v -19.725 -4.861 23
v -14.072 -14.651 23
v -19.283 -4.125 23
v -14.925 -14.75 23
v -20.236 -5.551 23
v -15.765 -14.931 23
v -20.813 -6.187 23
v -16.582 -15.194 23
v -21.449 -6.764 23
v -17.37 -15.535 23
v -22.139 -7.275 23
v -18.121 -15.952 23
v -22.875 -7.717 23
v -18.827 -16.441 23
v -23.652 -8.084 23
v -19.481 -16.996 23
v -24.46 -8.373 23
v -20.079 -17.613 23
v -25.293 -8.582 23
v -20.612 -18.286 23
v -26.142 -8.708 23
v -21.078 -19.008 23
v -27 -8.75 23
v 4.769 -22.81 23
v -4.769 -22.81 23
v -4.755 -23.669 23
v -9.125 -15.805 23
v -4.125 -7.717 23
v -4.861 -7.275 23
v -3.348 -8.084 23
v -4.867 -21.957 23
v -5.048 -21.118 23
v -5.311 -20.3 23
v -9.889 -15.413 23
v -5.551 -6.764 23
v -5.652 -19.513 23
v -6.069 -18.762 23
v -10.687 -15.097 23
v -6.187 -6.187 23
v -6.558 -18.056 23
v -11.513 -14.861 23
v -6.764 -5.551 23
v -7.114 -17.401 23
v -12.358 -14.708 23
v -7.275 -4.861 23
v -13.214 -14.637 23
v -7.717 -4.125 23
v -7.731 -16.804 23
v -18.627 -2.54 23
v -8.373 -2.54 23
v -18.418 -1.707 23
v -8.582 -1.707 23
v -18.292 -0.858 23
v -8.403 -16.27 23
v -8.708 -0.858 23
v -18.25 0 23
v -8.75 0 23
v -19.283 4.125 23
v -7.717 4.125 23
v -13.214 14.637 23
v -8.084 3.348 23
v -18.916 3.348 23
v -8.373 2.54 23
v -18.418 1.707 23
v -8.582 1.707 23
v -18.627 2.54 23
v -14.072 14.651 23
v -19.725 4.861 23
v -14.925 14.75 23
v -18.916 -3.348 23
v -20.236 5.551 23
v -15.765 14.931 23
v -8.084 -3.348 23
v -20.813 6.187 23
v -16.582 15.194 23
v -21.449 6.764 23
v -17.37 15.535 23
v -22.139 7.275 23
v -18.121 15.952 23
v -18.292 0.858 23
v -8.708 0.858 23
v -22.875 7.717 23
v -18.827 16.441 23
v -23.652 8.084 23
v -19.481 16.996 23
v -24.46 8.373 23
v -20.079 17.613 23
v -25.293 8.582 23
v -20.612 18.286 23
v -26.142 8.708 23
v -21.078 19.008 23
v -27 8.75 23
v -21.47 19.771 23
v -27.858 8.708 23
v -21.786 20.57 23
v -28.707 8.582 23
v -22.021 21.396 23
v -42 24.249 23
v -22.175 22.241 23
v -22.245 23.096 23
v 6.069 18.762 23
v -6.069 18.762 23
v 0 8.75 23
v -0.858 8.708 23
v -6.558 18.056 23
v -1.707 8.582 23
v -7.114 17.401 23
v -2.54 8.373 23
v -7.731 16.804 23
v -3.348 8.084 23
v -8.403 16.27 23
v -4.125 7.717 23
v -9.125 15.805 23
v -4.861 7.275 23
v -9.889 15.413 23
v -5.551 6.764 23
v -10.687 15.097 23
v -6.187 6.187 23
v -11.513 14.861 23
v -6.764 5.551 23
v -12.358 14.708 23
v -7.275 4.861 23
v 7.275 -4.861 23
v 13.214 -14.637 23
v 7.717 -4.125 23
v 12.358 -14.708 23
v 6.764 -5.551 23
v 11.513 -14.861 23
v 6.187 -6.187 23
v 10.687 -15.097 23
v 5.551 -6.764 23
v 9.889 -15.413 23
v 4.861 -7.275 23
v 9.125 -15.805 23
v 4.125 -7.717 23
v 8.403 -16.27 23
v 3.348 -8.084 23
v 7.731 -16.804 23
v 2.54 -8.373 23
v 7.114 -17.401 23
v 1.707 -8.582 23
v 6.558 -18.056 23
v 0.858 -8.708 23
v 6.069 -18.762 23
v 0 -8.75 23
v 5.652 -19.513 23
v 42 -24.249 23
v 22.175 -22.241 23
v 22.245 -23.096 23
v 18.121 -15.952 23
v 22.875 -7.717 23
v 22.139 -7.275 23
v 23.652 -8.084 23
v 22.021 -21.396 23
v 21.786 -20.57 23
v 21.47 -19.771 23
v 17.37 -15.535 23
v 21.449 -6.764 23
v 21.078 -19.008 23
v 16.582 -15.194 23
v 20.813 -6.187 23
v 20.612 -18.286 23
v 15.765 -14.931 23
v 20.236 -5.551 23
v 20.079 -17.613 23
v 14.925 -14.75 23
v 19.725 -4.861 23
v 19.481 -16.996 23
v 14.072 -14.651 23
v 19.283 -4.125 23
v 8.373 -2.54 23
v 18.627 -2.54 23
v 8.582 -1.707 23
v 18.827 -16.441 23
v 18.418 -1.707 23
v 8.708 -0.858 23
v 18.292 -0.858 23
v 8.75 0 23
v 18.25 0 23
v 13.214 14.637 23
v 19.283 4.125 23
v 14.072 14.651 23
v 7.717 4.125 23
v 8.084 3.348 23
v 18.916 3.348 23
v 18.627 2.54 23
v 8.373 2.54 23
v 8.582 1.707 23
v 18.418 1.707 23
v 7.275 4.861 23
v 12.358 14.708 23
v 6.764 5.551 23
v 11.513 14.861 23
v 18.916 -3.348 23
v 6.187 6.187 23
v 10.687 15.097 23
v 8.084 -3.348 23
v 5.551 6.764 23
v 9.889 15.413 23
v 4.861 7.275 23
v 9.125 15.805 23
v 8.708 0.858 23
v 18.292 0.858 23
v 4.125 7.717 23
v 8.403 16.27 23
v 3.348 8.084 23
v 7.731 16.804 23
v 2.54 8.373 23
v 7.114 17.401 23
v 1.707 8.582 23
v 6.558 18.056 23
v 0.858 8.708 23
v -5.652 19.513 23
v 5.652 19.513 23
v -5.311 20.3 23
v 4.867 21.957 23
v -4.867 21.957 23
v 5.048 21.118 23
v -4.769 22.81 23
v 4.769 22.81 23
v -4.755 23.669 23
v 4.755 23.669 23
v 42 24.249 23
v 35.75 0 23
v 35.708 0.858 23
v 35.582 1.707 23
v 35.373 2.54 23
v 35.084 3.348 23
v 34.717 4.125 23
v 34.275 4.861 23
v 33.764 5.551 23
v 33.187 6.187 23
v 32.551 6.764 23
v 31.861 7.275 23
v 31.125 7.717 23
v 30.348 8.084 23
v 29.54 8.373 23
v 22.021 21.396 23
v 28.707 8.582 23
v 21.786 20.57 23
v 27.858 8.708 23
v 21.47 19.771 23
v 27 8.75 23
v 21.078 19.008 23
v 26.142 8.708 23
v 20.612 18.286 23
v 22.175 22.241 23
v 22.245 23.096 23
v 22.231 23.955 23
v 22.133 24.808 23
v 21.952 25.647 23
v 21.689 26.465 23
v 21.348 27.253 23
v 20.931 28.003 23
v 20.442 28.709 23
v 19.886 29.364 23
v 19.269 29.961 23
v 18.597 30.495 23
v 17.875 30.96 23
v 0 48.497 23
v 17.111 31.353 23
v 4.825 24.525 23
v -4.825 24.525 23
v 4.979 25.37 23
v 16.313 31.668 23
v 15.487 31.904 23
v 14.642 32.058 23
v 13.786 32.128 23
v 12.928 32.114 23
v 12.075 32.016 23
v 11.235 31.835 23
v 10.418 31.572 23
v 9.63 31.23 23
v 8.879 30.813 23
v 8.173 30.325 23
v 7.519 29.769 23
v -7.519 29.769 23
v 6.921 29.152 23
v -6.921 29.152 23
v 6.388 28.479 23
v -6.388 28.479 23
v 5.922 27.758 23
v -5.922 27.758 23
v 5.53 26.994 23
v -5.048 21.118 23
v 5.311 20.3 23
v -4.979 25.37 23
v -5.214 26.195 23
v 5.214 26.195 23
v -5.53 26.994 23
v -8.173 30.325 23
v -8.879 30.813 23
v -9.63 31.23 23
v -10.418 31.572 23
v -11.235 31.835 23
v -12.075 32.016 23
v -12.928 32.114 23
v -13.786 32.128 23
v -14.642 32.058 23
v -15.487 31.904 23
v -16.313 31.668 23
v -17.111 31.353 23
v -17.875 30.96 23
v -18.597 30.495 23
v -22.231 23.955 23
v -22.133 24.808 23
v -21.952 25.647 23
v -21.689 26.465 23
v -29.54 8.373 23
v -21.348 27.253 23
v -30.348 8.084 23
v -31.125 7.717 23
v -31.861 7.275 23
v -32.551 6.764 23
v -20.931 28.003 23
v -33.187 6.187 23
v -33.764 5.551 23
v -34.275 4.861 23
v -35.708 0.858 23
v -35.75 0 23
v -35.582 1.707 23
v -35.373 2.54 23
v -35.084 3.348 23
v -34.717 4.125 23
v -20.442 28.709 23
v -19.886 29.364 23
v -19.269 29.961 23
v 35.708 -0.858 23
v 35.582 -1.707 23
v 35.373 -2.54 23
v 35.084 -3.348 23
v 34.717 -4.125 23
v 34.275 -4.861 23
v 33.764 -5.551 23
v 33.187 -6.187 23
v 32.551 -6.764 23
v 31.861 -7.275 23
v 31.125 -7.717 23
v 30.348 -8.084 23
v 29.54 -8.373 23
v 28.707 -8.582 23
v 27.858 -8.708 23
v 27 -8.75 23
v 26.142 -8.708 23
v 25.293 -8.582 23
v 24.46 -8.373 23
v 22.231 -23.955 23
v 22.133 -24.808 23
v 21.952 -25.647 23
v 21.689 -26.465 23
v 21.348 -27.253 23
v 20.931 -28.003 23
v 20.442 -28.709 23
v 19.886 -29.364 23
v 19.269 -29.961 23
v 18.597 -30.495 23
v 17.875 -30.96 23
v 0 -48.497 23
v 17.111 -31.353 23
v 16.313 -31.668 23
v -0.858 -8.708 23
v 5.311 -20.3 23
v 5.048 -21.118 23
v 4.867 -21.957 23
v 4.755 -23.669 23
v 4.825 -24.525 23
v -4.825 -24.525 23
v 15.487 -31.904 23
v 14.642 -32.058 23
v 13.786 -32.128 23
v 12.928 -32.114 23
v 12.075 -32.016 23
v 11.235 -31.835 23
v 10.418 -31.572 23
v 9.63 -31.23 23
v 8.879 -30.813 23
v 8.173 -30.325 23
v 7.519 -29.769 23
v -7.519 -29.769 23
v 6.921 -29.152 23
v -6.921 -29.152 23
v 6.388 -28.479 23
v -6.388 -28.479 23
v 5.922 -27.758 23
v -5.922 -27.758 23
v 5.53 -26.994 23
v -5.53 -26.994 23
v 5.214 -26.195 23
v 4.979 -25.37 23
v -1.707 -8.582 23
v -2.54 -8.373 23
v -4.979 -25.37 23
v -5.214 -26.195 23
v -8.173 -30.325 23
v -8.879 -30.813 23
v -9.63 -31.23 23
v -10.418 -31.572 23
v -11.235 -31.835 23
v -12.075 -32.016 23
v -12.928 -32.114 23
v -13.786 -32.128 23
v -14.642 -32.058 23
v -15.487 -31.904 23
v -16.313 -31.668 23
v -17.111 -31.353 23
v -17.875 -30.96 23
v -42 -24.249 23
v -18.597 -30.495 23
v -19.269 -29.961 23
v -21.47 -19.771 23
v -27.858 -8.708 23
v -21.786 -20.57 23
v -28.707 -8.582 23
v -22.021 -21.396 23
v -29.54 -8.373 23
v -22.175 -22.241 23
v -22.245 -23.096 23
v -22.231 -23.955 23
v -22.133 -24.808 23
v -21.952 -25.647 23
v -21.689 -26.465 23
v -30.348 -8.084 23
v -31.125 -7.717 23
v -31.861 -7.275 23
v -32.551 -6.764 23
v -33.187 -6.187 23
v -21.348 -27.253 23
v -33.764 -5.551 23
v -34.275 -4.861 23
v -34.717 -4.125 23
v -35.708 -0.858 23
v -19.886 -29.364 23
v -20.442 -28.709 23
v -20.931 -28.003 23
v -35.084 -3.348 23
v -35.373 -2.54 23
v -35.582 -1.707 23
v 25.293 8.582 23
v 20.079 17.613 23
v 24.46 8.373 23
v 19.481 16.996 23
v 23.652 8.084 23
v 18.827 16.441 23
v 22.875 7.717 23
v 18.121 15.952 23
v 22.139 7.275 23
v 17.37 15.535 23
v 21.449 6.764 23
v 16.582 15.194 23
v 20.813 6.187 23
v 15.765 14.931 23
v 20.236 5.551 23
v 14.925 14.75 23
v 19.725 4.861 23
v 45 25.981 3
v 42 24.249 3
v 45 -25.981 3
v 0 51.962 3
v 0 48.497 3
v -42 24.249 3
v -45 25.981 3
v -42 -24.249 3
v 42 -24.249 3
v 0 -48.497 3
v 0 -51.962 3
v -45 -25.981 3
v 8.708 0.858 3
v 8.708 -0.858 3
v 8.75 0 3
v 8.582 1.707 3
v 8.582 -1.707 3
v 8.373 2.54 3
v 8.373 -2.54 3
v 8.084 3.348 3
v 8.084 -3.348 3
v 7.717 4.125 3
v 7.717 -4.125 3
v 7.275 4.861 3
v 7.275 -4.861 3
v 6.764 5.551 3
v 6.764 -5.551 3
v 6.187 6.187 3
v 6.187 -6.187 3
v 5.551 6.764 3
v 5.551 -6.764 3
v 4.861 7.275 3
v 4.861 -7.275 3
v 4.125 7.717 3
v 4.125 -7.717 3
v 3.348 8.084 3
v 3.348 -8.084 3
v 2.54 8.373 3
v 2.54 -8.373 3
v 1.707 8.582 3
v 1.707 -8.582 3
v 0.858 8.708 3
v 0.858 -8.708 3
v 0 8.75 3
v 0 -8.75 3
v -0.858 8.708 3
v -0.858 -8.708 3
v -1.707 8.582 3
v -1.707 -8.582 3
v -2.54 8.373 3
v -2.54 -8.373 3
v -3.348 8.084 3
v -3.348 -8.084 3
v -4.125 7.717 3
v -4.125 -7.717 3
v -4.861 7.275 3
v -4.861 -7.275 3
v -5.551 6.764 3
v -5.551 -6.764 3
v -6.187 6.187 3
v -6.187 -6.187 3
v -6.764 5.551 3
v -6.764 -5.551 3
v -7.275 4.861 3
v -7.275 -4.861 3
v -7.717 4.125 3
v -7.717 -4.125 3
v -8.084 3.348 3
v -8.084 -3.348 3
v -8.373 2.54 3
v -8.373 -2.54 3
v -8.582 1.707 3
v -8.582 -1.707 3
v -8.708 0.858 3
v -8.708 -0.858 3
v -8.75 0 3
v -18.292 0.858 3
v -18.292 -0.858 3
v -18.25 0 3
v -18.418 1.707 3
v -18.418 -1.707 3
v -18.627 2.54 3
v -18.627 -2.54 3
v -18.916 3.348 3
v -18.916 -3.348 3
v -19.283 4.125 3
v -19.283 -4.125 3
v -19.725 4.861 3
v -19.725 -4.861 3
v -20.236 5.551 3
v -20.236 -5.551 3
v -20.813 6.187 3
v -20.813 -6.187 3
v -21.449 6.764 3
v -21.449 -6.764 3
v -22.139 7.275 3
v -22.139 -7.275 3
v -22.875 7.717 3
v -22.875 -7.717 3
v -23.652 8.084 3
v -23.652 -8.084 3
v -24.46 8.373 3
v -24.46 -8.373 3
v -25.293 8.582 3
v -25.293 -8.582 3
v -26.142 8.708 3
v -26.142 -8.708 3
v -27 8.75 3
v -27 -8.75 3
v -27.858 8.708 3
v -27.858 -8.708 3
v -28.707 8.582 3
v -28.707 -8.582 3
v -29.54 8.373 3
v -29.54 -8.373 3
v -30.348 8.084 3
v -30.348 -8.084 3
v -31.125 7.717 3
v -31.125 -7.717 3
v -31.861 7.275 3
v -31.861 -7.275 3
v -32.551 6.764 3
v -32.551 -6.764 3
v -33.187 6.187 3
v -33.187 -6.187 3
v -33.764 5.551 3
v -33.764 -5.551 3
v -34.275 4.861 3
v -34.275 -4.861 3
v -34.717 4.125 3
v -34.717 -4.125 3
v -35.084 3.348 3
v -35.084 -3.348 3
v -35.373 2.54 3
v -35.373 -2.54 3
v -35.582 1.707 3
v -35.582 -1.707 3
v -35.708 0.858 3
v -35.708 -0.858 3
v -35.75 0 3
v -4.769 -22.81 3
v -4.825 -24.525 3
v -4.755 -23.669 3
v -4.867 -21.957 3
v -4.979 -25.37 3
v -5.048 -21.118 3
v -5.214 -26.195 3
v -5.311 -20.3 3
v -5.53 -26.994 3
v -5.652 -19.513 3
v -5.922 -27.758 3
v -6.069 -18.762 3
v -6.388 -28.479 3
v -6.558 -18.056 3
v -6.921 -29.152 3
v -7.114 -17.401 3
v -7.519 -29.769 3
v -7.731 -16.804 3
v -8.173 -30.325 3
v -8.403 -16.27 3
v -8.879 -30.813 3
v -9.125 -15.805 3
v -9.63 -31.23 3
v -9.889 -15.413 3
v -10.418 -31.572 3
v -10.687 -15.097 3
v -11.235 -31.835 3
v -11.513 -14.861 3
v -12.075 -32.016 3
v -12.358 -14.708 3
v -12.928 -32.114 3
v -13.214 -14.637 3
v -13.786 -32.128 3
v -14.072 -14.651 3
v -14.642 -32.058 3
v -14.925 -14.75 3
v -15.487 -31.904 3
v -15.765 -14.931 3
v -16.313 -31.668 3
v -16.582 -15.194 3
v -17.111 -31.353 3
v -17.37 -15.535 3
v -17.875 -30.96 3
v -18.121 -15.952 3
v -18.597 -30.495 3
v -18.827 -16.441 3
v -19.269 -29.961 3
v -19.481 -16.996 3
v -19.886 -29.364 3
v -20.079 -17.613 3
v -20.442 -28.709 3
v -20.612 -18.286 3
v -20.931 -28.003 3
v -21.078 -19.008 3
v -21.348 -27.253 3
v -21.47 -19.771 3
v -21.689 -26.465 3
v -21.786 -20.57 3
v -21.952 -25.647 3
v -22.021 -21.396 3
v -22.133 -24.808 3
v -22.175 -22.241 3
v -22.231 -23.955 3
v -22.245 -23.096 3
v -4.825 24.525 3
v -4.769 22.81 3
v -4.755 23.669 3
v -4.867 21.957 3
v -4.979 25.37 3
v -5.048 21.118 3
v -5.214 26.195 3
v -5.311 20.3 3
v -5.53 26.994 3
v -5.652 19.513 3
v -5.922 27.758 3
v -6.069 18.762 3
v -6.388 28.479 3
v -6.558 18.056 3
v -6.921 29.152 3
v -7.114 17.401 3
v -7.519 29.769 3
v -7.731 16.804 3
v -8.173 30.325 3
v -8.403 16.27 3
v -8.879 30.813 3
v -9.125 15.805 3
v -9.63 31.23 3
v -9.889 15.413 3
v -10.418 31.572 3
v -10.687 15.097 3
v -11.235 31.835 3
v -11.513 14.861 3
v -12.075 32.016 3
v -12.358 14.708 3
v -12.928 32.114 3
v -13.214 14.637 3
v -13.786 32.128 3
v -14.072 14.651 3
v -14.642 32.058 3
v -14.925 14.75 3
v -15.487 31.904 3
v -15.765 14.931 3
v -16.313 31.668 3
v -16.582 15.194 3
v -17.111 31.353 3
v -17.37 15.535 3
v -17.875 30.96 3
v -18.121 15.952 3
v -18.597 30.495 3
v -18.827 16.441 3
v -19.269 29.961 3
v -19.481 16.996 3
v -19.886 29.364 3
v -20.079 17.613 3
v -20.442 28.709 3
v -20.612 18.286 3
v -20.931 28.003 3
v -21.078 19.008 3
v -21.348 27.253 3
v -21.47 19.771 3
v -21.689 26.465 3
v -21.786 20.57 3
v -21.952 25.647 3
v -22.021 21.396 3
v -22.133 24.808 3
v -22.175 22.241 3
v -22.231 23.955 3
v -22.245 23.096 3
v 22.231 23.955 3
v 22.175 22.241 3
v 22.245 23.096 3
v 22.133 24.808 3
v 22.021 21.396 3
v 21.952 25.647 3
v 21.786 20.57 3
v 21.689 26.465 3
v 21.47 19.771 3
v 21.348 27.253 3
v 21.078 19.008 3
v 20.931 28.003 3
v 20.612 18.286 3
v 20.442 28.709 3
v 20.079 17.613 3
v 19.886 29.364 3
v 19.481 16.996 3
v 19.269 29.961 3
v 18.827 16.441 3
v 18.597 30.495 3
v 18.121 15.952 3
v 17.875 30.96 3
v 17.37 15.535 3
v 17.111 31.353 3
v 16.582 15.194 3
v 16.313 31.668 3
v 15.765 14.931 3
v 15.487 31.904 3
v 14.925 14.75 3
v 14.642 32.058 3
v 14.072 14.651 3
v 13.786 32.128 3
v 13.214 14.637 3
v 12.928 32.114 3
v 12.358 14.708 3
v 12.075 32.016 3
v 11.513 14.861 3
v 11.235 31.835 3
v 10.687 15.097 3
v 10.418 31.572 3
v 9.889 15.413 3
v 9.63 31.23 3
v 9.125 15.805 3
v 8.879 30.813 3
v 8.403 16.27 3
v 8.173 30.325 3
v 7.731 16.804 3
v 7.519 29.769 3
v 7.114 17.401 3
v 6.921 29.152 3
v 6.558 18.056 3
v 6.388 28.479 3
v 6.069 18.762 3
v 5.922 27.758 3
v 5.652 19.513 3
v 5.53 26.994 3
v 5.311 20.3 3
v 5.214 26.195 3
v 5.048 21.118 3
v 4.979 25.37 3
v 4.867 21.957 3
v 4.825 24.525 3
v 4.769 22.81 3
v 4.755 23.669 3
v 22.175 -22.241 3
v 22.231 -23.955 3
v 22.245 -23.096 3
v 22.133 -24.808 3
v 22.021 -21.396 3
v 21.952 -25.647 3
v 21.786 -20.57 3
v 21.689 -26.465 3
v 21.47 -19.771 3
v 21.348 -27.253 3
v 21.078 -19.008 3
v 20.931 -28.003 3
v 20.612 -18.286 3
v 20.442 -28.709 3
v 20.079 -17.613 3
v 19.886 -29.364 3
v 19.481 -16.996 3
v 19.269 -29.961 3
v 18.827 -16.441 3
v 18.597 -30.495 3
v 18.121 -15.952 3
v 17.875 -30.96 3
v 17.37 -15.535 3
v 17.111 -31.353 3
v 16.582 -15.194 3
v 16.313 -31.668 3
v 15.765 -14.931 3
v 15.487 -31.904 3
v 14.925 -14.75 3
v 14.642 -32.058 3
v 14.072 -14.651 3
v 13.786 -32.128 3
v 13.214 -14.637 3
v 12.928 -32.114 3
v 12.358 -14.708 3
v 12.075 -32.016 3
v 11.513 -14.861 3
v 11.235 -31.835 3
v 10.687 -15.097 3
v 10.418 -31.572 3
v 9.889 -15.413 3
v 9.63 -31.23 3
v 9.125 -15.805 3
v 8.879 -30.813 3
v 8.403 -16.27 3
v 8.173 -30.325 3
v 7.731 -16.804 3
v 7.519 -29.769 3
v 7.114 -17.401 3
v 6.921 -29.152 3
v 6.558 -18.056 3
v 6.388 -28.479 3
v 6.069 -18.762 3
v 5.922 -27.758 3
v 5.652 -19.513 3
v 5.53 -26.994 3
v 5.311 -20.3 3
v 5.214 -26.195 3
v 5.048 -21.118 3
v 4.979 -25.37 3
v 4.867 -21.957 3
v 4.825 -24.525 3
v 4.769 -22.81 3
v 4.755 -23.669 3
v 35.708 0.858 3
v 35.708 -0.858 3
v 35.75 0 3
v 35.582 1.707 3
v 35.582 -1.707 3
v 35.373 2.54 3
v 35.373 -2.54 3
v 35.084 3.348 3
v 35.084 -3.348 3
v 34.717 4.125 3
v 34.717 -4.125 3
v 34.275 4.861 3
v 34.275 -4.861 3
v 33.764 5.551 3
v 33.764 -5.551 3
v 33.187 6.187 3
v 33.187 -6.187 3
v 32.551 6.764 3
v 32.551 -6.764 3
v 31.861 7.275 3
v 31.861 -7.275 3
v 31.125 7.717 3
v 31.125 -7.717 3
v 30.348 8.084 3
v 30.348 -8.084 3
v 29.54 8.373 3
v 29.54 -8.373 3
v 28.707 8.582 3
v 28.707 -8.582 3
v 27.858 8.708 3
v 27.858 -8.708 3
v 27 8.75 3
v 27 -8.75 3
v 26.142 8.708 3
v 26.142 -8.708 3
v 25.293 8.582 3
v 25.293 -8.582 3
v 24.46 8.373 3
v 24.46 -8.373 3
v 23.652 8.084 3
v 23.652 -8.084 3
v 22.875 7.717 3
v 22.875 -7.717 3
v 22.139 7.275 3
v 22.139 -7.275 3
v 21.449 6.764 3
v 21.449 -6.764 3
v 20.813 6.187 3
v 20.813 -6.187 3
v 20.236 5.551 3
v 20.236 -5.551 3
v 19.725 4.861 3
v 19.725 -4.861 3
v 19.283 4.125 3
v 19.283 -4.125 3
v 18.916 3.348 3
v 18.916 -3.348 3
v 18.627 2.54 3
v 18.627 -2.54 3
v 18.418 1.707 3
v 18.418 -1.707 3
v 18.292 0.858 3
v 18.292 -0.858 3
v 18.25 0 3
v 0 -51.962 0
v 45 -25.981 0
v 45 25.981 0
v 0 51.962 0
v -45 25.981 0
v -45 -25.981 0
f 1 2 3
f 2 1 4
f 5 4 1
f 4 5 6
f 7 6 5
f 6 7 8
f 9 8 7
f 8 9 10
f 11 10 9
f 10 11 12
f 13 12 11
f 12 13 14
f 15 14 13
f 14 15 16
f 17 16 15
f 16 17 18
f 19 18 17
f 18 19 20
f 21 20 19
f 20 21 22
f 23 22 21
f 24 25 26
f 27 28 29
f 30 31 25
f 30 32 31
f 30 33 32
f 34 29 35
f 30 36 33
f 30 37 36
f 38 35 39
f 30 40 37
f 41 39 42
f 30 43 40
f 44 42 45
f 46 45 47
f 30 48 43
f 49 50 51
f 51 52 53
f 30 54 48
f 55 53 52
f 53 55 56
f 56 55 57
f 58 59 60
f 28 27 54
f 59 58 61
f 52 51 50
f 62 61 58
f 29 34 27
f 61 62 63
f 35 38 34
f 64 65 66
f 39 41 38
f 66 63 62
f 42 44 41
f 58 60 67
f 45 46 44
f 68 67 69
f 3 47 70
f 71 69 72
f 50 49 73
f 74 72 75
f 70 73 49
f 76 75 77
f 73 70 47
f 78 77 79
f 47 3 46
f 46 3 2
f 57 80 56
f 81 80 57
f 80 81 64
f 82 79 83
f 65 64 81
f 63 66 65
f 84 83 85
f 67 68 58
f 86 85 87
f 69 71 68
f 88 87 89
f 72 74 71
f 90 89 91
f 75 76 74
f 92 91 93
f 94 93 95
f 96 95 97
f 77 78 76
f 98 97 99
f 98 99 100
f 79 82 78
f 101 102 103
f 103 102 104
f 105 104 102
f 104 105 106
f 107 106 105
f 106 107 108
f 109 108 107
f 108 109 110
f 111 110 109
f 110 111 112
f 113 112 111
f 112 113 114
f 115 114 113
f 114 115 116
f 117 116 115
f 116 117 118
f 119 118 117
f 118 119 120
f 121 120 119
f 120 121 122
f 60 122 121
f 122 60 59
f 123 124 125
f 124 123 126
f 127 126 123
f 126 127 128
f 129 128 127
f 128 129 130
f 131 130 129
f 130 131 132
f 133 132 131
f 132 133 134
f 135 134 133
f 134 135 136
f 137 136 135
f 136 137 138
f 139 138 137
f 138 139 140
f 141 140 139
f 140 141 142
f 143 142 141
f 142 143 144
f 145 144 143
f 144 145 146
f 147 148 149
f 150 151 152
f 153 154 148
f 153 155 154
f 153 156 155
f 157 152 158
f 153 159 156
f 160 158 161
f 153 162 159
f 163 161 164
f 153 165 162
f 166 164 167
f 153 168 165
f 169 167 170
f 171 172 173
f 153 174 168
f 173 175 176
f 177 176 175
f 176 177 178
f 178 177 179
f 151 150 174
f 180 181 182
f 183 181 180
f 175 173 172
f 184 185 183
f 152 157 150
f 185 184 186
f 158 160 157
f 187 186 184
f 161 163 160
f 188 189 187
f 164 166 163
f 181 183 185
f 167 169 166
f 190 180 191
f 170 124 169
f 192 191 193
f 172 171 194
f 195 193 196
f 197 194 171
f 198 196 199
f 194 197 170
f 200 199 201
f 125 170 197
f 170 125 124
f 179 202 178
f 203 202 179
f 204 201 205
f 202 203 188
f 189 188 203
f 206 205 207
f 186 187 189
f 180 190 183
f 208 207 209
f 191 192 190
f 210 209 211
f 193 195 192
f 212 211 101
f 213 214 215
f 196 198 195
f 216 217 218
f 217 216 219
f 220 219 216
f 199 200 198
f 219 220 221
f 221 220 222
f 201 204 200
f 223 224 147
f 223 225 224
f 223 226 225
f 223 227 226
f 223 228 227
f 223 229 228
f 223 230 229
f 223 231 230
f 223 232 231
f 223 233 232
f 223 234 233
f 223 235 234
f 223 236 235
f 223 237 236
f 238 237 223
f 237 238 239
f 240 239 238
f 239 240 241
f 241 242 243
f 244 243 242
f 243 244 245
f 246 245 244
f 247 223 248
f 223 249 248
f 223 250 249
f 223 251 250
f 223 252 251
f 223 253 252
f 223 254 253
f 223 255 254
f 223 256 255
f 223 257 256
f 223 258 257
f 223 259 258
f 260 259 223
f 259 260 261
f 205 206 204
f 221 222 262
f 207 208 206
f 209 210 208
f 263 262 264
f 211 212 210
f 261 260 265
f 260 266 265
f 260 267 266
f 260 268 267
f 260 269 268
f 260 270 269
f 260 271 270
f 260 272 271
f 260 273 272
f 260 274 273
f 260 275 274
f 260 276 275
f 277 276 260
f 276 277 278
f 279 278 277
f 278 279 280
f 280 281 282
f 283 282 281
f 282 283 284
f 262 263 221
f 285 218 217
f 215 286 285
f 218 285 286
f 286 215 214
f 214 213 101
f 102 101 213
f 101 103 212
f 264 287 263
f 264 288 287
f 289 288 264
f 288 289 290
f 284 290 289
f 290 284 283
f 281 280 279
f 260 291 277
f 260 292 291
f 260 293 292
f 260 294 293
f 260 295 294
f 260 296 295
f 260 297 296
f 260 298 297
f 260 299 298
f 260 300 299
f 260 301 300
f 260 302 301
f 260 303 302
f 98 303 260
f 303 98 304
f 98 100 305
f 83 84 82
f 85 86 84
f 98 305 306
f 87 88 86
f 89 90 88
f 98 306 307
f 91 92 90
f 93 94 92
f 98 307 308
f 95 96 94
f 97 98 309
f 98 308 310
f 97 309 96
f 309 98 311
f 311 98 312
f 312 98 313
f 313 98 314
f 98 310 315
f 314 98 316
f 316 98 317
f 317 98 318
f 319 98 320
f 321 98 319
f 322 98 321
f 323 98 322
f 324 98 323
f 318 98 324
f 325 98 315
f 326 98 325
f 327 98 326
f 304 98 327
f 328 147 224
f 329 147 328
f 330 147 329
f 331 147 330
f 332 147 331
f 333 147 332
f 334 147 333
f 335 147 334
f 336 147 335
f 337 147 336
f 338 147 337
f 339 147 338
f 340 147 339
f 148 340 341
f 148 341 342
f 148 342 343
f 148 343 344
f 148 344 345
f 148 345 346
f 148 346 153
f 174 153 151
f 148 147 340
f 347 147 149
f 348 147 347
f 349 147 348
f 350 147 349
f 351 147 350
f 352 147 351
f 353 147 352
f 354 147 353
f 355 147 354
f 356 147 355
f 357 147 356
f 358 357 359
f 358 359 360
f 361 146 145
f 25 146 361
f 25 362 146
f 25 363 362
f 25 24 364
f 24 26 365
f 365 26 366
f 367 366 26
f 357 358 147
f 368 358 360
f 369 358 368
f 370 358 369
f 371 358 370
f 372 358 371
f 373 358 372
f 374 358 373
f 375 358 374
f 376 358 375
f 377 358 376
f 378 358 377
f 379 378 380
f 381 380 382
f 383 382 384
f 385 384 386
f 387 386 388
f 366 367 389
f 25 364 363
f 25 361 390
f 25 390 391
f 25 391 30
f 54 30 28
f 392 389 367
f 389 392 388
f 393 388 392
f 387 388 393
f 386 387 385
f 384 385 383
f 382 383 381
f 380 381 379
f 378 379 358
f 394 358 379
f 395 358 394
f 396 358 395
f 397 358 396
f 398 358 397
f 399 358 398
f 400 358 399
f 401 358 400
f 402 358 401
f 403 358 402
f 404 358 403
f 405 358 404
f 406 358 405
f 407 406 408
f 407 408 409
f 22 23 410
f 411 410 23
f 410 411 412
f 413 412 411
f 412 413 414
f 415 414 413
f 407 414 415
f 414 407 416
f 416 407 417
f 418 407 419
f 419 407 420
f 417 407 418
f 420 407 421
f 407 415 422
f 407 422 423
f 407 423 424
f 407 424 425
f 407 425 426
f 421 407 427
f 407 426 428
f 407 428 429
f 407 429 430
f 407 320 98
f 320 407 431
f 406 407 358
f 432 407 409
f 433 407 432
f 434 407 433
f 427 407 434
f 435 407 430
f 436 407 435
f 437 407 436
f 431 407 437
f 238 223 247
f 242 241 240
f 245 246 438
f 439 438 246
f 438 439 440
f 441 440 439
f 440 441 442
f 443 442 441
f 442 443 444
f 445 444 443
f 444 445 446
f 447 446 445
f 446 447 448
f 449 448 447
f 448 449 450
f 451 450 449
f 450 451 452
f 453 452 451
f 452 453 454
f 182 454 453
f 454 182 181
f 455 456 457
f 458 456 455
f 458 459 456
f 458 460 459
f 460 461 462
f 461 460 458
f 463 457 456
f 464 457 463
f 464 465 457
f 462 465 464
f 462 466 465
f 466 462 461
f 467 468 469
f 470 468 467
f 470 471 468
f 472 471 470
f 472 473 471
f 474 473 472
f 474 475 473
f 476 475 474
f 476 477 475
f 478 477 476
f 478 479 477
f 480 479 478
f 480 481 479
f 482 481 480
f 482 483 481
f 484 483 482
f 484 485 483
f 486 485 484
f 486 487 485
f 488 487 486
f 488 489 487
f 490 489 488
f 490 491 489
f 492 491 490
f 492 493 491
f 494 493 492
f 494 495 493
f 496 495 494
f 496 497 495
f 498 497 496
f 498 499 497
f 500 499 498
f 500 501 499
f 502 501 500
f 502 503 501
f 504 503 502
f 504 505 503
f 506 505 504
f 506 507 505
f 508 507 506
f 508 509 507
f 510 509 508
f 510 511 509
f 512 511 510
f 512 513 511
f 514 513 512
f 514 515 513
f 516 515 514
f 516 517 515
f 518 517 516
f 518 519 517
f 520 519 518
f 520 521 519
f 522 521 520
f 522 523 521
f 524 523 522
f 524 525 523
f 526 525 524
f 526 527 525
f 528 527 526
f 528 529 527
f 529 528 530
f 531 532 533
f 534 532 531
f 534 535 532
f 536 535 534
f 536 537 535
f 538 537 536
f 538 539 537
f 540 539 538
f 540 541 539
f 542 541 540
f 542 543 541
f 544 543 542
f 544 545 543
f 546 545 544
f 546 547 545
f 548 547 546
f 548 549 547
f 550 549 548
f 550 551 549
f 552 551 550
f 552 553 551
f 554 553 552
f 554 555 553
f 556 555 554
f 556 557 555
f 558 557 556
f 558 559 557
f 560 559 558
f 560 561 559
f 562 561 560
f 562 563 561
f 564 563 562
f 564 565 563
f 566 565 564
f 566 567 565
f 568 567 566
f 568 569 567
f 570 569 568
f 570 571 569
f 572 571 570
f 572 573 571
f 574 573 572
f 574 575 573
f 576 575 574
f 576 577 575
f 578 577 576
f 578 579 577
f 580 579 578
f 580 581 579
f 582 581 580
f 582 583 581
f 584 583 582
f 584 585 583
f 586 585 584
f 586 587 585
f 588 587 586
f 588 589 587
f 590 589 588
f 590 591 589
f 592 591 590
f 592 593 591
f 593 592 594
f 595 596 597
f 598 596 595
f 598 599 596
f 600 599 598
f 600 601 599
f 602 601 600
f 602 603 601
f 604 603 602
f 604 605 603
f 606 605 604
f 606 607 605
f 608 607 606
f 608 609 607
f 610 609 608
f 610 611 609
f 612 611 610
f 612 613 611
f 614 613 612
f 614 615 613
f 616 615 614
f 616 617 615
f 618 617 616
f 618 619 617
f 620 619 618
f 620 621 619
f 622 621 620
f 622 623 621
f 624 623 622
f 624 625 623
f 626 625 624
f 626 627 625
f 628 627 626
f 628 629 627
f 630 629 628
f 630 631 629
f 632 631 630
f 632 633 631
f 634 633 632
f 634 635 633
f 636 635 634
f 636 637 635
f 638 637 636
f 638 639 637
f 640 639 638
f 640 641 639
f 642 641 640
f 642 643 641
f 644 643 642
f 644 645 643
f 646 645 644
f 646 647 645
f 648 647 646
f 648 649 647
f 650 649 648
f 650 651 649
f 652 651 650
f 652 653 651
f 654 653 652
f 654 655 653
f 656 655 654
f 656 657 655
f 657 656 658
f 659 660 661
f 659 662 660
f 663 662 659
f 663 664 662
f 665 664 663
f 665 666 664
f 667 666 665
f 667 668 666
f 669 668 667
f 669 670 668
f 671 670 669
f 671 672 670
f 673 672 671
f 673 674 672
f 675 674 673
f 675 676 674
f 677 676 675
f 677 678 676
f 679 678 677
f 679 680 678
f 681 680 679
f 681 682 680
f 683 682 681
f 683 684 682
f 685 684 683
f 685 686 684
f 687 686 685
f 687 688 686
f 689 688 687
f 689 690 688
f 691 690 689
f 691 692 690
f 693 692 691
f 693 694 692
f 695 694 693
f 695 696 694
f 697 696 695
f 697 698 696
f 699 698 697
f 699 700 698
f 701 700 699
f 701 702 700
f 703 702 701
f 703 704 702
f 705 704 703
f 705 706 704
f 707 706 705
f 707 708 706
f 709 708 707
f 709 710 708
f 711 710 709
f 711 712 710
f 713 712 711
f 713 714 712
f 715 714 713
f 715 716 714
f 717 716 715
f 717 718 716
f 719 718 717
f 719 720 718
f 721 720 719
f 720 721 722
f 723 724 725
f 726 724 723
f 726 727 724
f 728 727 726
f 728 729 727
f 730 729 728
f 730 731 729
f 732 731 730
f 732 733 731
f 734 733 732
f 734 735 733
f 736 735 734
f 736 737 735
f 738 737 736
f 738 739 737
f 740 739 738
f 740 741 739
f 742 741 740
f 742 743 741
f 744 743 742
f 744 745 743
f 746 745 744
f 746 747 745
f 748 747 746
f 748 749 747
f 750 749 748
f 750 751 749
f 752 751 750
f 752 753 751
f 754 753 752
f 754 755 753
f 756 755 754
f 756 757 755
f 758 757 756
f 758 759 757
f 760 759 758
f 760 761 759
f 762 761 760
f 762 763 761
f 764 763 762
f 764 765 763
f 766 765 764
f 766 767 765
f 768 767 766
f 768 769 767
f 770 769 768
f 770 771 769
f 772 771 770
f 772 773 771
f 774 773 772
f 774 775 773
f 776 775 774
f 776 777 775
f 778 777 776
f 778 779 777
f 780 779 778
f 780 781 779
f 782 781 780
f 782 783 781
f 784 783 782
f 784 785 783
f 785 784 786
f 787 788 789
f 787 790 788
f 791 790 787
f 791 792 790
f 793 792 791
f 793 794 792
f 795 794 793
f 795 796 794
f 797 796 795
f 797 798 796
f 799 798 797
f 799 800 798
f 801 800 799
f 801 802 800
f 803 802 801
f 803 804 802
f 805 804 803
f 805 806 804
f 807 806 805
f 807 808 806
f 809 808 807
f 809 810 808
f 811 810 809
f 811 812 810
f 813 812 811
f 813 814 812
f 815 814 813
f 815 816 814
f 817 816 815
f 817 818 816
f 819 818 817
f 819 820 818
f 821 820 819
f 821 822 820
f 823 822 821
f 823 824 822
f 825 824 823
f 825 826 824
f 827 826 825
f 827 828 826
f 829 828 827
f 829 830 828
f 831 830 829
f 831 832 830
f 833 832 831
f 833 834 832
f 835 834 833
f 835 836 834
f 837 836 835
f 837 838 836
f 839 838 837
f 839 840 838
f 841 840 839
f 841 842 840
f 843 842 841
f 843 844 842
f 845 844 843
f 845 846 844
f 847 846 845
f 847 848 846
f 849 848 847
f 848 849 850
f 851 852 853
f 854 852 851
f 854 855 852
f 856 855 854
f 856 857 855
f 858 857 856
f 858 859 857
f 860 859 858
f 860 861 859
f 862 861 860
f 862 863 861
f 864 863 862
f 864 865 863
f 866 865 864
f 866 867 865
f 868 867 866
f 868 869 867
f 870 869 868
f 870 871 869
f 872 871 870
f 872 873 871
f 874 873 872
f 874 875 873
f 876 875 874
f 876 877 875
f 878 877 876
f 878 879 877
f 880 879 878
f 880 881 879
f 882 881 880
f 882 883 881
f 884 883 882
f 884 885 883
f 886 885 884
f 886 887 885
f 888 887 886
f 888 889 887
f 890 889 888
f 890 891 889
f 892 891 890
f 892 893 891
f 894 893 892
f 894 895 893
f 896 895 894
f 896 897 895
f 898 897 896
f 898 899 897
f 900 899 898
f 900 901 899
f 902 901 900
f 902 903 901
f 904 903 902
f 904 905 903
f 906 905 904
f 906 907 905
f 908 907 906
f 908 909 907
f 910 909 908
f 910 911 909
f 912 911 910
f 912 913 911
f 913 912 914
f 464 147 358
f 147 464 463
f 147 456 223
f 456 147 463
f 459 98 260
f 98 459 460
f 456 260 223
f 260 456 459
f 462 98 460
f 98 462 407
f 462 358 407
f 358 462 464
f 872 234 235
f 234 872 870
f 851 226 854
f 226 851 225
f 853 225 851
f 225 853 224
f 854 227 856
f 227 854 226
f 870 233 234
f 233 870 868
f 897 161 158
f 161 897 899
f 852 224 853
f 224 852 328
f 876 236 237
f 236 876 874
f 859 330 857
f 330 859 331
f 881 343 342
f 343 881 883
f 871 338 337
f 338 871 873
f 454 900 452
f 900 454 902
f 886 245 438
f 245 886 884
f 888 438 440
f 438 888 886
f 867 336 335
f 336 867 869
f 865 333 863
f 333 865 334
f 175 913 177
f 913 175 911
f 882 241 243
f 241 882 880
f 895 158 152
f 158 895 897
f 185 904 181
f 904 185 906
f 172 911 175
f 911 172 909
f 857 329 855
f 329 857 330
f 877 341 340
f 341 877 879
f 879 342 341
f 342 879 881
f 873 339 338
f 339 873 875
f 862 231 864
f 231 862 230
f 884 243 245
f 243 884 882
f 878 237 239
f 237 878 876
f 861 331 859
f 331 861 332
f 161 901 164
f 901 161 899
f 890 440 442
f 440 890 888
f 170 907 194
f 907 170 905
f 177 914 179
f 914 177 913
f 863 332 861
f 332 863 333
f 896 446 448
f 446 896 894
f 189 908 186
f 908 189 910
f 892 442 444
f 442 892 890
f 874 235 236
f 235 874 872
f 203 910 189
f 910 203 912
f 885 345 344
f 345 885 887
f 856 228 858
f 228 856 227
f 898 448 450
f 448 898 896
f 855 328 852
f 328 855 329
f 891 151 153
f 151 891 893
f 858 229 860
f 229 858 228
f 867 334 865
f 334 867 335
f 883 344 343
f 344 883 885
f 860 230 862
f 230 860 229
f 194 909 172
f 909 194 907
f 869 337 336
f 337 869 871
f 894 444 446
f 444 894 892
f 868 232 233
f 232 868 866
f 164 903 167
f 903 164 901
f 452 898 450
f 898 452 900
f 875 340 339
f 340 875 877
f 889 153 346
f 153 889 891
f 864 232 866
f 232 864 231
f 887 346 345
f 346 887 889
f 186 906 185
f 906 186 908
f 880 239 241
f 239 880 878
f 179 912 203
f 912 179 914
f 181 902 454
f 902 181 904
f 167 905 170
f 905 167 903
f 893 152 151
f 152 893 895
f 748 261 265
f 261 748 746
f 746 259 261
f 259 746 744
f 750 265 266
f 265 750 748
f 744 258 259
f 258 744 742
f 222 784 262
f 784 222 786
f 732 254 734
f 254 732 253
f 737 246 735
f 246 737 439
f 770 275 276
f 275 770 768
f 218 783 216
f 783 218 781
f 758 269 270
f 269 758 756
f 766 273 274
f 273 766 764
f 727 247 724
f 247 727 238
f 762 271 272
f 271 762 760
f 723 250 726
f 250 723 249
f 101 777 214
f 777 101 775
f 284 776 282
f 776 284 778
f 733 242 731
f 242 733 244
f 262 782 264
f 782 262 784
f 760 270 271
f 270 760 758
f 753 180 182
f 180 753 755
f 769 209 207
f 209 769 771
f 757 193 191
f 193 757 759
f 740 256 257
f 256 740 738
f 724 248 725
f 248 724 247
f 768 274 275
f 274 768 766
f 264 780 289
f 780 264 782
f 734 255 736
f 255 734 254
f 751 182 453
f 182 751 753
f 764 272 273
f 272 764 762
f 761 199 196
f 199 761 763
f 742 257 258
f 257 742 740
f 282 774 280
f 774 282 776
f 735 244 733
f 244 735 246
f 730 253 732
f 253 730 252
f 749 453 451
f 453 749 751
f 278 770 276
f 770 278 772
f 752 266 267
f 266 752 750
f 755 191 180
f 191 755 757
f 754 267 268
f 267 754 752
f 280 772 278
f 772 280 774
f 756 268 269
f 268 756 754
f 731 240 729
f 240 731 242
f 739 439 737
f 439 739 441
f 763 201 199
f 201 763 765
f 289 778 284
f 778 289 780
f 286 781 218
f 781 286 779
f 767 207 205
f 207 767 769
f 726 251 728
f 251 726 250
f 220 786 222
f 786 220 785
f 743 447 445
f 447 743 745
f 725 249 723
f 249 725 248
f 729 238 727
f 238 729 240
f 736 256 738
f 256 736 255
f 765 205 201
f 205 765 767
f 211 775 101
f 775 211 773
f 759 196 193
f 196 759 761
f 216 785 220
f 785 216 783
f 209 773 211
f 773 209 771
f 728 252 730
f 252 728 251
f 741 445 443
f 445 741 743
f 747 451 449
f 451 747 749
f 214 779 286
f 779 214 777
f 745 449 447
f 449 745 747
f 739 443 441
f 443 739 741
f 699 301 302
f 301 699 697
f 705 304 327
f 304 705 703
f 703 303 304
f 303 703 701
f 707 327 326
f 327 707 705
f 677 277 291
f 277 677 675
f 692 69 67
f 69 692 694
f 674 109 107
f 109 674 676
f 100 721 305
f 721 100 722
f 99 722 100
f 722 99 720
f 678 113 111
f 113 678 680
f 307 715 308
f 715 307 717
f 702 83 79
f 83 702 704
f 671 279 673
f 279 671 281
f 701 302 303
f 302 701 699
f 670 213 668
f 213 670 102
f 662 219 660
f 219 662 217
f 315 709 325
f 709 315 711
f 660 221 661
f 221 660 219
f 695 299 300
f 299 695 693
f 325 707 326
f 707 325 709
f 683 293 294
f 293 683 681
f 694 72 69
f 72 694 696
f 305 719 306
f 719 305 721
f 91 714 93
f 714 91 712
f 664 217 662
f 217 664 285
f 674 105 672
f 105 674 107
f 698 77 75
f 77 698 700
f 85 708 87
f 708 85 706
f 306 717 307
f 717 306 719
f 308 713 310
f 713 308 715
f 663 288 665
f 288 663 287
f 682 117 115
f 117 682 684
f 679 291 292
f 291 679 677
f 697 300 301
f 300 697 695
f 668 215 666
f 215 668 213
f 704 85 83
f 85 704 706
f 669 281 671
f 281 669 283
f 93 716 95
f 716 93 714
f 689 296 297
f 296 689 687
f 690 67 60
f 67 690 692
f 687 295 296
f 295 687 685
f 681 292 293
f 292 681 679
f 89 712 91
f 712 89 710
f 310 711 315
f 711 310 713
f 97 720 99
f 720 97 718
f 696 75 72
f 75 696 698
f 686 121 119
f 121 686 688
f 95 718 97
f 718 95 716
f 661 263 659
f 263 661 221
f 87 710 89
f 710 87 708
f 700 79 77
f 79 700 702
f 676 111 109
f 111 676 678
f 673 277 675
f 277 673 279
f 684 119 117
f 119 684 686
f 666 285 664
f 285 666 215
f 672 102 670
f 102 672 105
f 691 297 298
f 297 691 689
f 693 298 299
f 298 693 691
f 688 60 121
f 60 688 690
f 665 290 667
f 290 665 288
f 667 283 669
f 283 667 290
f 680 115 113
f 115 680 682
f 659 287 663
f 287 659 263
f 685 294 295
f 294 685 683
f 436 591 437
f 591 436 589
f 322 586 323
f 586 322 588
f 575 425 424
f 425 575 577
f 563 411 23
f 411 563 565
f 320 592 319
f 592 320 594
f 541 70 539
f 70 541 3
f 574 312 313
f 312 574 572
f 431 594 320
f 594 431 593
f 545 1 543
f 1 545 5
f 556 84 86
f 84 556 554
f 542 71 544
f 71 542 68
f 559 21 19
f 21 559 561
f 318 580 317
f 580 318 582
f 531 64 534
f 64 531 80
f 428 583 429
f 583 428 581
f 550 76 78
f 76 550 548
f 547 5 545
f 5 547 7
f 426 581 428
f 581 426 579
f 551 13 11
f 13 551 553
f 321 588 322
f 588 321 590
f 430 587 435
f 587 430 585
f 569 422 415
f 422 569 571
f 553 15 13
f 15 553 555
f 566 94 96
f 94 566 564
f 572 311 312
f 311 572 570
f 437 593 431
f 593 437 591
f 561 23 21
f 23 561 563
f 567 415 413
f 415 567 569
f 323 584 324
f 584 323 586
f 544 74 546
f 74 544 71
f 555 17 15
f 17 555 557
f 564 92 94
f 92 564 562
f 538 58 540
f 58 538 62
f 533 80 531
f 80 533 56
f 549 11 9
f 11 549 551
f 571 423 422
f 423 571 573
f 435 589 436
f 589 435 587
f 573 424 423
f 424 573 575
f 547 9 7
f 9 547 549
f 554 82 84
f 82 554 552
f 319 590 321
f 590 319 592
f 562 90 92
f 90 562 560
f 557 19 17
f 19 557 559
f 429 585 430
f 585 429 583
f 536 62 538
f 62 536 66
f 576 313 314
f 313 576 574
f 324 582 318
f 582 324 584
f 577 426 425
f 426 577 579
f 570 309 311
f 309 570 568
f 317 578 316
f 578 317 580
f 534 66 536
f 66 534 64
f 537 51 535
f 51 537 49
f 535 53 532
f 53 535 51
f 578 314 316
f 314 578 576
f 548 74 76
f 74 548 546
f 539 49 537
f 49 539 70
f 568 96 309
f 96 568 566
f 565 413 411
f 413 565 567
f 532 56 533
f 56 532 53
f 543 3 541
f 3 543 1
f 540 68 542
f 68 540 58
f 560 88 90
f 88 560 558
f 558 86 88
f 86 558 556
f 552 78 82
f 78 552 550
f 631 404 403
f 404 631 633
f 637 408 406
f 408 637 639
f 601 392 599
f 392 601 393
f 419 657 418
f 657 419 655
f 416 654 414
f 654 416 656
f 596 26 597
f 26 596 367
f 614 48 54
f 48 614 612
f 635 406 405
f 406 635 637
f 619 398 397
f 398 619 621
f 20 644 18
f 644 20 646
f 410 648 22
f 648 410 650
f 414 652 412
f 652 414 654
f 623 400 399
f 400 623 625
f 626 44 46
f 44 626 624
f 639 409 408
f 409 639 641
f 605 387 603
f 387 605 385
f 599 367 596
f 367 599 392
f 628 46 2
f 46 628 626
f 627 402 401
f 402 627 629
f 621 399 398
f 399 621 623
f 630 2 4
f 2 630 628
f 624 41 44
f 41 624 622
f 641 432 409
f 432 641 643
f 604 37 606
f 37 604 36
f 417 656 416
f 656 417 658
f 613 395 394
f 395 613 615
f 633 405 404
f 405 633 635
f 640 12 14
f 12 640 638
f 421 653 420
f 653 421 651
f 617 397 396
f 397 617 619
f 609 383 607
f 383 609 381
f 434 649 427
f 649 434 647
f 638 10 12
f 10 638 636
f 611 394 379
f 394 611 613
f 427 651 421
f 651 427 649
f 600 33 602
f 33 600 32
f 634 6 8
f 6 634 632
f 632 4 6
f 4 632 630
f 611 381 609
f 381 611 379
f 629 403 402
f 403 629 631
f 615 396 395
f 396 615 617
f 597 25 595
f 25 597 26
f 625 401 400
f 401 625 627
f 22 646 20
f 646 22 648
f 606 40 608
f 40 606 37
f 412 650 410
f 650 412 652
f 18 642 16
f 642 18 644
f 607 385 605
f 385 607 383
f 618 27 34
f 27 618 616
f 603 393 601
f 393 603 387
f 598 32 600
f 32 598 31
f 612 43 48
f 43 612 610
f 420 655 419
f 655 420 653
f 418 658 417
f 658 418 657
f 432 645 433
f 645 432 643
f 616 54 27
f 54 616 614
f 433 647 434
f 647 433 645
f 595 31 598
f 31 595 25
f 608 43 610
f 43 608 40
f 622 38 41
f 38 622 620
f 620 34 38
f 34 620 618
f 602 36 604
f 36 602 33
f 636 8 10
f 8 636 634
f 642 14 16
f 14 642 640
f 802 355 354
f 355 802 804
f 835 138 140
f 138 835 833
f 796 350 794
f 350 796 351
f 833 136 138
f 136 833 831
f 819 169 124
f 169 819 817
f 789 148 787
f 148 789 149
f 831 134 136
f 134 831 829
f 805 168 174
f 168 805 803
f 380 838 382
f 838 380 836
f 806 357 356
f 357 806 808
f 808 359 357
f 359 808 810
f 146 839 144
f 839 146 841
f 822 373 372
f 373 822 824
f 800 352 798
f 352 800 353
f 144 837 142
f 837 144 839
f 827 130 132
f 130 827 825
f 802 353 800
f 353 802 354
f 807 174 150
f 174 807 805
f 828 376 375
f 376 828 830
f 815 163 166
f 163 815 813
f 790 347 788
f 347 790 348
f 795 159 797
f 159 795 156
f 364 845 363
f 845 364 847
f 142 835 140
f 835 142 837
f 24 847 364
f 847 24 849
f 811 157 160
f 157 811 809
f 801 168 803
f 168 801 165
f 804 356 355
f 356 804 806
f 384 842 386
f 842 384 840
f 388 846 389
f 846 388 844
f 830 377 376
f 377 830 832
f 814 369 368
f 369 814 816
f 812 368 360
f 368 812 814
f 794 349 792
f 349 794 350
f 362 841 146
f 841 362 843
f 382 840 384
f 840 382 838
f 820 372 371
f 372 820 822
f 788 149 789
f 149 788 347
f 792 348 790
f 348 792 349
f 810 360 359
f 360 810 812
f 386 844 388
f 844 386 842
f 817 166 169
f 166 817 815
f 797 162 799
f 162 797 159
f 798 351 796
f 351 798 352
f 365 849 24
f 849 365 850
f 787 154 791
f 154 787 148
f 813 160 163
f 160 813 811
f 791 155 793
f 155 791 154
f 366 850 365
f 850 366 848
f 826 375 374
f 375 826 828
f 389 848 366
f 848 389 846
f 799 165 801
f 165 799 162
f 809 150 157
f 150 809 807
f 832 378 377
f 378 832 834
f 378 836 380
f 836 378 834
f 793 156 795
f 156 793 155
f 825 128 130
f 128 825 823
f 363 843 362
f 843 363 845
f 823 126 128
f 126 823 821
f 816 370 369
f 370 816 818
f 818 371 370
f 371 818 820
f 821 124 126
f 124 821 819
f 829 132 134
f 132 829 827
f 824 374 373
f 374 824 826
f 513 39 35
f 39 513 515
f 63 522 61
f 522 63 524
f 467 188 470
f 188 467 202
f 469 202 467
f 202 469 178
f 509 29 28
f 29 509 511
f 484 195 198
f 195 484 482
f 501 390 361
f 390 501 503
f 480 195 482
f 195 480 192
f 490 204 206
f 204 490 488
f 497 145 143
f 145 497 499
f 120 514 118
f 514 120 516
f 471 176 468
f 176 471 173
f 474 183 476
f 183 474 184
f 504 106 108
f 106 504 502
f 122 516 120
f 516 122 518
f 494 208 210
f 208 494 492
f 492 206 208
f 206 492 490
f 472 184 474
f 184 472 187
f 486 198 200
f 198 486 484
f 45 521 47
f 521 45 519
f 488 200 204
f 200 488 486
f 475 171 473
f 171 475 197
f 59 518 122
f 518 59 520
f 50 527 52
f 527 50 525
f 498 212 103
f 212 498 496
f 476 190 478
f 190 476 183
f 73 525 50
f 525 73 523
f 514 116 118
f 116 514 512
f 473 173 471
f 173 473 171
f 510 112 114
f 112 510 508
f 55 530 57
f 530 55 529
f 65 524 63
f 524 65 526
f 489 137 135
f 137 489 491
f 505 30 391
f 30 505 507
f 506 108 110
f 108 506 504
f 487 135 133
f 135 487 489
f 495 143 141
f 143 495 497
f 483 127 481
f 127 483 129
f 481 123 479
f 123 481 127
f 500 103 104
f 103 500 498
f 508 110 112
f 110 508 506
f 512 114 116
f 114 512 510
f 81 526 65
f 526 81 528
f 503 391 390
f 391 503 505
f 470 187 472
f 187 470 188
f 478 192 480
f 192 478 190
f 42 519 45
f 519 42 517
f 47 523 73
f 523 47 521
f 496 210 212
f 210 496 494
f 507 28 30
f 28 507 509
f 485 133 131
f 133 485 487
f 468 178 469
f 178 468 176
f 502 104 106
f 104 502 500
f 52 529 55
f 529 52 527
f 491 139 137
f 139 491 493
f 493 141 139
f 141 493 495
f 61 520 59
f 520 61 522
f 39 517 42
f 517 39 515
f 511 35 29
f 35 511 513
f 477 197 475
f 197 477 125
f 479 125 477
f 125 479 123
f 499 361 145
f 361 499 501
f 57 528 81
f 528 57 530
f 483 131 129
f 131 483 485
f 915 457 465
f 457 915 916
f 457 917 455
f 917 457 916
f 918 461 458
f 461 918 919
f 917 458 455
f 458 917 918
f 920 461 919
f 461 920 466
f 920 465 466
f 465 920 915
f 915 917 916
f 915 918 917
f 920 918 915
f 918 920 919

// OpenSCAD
// --- Dimensions ---
plate_thickness = 3;           // Thickness of the base plate
hexagon_across_flats = 90;      // Width of the hexagonal plate (flat-to-flat)
skirt_across_flats = 84;        // Width of the hexagonal skirt (flat-to-flat)
skirt_height = 20;              // Height of the skirt (rising from the plate)

hole_diameter = 17.5;           // Diameter of the conical tube holes
hole_spacing_diameter = 54;     // Diameter of the circle passing through hole centers
sleeve_outer_diameter = 21.5;   // Outside diameter of the sleeves
sleeve_height = 20;             // Height of the sleeves (rising from the plate)

// --- Constants ---
$fn = 64;

// --- Helper Modules ---

// Function to calculate the radius of a hexagon given the distance across flats
// A hexagon with distance 'd' across flats has a circumradius R = d / (2 * cos(30))
function hex_radius(across_flats) = (across_flats / 2) / cos(30);

// Module to create a hexagonal prism
// To ensure flats are parallel to the X axis, we rotate by 30 degrees.
// This places the vertices on the Y axis and the flat faces perpendicular to the X axis.
module hexagon_prism(across_flats, height) {
    r = hex_radius(across_flats);
    rotate([0, 0, 30])
    cylinder(h = height, r = r, $fn = 6);
}

// --- Main Construction ---
// The part is built with the plate at Z=0.
// The user will flip it for use so the skirt/sleeves trap air.

union() {
    // 1. The Base Plate
    // A hexagon with 90mm across flats.
    hexagon_prism(hexagon_across_flats, plate_thickness);

    // 2. The Sleeves and Skirt
    difference() {
        union() {
            // The Hexagonal Skirt
            // Rises from the plate (z=3) to z=23.
            translate([0, 0, plate_thickness])
            hexagon_prism(skirt_across_flats, skirt_height);

            // The 7 Sleeves
            // Center sleeve
            translate([0, 0, plate_thickness])
            cylinder(h = sleeve_height, d = sleeve_outer_diameter);

            // 6 Peripheral sleeves
            for (i = [0 : 5]) {
                angle = i * 60;
                rotate([0, 0, angle])
                translate([hole_spacing_diameter / 2, 0, plate_thickness])
                cylinder(h = sleeve_height, d = sleeve_outer_diameter);
            }
        }

        // --- Subtraction: The Holes ---
        // Holes must pass through the plate AND the sleeves.
        // We extend the cylinders slightly to ensure clean cuts.
        
        // Center hole
        translate([0, 0, -0.01])
        cylinder(h = plate_thickness + sleeve_height + 0.02, d = hole_diameter);

        // Peripheral holes
        for (i = [0 : 5]) {
            angle = i * 60;
            rotate([0, 0, angle])
            translate([hole_spacing_diameter / 2, 0, -0.01])
            cylinder(h = plate_thickness + sleeve_height + 0.02, d = hole_diameter);
        }
    }
}

// Verification of geometry:
// Plate: Z=0 to 3.
// Skirt/Sleeves: Z=3 to 23.
// Total Height: 23mm.
// Hexagon orientation: 30 deg rotation ensures flats are parallel to X axis.
// Bounding Box Check: 
// Hexagon 90mm across flats -> Vertex to vertex (circumradius) is 90 / sqrt(3) = 51.96.
// Total width (X) = 2 * 51.96 * sin(60) = 90 (Wait, across flats is 90, so X-width is 90).
// Total depth (Y) = 2 * 51.96 = 103.92.
// This matches the report's bounding box: X 90, Y 103.92.
